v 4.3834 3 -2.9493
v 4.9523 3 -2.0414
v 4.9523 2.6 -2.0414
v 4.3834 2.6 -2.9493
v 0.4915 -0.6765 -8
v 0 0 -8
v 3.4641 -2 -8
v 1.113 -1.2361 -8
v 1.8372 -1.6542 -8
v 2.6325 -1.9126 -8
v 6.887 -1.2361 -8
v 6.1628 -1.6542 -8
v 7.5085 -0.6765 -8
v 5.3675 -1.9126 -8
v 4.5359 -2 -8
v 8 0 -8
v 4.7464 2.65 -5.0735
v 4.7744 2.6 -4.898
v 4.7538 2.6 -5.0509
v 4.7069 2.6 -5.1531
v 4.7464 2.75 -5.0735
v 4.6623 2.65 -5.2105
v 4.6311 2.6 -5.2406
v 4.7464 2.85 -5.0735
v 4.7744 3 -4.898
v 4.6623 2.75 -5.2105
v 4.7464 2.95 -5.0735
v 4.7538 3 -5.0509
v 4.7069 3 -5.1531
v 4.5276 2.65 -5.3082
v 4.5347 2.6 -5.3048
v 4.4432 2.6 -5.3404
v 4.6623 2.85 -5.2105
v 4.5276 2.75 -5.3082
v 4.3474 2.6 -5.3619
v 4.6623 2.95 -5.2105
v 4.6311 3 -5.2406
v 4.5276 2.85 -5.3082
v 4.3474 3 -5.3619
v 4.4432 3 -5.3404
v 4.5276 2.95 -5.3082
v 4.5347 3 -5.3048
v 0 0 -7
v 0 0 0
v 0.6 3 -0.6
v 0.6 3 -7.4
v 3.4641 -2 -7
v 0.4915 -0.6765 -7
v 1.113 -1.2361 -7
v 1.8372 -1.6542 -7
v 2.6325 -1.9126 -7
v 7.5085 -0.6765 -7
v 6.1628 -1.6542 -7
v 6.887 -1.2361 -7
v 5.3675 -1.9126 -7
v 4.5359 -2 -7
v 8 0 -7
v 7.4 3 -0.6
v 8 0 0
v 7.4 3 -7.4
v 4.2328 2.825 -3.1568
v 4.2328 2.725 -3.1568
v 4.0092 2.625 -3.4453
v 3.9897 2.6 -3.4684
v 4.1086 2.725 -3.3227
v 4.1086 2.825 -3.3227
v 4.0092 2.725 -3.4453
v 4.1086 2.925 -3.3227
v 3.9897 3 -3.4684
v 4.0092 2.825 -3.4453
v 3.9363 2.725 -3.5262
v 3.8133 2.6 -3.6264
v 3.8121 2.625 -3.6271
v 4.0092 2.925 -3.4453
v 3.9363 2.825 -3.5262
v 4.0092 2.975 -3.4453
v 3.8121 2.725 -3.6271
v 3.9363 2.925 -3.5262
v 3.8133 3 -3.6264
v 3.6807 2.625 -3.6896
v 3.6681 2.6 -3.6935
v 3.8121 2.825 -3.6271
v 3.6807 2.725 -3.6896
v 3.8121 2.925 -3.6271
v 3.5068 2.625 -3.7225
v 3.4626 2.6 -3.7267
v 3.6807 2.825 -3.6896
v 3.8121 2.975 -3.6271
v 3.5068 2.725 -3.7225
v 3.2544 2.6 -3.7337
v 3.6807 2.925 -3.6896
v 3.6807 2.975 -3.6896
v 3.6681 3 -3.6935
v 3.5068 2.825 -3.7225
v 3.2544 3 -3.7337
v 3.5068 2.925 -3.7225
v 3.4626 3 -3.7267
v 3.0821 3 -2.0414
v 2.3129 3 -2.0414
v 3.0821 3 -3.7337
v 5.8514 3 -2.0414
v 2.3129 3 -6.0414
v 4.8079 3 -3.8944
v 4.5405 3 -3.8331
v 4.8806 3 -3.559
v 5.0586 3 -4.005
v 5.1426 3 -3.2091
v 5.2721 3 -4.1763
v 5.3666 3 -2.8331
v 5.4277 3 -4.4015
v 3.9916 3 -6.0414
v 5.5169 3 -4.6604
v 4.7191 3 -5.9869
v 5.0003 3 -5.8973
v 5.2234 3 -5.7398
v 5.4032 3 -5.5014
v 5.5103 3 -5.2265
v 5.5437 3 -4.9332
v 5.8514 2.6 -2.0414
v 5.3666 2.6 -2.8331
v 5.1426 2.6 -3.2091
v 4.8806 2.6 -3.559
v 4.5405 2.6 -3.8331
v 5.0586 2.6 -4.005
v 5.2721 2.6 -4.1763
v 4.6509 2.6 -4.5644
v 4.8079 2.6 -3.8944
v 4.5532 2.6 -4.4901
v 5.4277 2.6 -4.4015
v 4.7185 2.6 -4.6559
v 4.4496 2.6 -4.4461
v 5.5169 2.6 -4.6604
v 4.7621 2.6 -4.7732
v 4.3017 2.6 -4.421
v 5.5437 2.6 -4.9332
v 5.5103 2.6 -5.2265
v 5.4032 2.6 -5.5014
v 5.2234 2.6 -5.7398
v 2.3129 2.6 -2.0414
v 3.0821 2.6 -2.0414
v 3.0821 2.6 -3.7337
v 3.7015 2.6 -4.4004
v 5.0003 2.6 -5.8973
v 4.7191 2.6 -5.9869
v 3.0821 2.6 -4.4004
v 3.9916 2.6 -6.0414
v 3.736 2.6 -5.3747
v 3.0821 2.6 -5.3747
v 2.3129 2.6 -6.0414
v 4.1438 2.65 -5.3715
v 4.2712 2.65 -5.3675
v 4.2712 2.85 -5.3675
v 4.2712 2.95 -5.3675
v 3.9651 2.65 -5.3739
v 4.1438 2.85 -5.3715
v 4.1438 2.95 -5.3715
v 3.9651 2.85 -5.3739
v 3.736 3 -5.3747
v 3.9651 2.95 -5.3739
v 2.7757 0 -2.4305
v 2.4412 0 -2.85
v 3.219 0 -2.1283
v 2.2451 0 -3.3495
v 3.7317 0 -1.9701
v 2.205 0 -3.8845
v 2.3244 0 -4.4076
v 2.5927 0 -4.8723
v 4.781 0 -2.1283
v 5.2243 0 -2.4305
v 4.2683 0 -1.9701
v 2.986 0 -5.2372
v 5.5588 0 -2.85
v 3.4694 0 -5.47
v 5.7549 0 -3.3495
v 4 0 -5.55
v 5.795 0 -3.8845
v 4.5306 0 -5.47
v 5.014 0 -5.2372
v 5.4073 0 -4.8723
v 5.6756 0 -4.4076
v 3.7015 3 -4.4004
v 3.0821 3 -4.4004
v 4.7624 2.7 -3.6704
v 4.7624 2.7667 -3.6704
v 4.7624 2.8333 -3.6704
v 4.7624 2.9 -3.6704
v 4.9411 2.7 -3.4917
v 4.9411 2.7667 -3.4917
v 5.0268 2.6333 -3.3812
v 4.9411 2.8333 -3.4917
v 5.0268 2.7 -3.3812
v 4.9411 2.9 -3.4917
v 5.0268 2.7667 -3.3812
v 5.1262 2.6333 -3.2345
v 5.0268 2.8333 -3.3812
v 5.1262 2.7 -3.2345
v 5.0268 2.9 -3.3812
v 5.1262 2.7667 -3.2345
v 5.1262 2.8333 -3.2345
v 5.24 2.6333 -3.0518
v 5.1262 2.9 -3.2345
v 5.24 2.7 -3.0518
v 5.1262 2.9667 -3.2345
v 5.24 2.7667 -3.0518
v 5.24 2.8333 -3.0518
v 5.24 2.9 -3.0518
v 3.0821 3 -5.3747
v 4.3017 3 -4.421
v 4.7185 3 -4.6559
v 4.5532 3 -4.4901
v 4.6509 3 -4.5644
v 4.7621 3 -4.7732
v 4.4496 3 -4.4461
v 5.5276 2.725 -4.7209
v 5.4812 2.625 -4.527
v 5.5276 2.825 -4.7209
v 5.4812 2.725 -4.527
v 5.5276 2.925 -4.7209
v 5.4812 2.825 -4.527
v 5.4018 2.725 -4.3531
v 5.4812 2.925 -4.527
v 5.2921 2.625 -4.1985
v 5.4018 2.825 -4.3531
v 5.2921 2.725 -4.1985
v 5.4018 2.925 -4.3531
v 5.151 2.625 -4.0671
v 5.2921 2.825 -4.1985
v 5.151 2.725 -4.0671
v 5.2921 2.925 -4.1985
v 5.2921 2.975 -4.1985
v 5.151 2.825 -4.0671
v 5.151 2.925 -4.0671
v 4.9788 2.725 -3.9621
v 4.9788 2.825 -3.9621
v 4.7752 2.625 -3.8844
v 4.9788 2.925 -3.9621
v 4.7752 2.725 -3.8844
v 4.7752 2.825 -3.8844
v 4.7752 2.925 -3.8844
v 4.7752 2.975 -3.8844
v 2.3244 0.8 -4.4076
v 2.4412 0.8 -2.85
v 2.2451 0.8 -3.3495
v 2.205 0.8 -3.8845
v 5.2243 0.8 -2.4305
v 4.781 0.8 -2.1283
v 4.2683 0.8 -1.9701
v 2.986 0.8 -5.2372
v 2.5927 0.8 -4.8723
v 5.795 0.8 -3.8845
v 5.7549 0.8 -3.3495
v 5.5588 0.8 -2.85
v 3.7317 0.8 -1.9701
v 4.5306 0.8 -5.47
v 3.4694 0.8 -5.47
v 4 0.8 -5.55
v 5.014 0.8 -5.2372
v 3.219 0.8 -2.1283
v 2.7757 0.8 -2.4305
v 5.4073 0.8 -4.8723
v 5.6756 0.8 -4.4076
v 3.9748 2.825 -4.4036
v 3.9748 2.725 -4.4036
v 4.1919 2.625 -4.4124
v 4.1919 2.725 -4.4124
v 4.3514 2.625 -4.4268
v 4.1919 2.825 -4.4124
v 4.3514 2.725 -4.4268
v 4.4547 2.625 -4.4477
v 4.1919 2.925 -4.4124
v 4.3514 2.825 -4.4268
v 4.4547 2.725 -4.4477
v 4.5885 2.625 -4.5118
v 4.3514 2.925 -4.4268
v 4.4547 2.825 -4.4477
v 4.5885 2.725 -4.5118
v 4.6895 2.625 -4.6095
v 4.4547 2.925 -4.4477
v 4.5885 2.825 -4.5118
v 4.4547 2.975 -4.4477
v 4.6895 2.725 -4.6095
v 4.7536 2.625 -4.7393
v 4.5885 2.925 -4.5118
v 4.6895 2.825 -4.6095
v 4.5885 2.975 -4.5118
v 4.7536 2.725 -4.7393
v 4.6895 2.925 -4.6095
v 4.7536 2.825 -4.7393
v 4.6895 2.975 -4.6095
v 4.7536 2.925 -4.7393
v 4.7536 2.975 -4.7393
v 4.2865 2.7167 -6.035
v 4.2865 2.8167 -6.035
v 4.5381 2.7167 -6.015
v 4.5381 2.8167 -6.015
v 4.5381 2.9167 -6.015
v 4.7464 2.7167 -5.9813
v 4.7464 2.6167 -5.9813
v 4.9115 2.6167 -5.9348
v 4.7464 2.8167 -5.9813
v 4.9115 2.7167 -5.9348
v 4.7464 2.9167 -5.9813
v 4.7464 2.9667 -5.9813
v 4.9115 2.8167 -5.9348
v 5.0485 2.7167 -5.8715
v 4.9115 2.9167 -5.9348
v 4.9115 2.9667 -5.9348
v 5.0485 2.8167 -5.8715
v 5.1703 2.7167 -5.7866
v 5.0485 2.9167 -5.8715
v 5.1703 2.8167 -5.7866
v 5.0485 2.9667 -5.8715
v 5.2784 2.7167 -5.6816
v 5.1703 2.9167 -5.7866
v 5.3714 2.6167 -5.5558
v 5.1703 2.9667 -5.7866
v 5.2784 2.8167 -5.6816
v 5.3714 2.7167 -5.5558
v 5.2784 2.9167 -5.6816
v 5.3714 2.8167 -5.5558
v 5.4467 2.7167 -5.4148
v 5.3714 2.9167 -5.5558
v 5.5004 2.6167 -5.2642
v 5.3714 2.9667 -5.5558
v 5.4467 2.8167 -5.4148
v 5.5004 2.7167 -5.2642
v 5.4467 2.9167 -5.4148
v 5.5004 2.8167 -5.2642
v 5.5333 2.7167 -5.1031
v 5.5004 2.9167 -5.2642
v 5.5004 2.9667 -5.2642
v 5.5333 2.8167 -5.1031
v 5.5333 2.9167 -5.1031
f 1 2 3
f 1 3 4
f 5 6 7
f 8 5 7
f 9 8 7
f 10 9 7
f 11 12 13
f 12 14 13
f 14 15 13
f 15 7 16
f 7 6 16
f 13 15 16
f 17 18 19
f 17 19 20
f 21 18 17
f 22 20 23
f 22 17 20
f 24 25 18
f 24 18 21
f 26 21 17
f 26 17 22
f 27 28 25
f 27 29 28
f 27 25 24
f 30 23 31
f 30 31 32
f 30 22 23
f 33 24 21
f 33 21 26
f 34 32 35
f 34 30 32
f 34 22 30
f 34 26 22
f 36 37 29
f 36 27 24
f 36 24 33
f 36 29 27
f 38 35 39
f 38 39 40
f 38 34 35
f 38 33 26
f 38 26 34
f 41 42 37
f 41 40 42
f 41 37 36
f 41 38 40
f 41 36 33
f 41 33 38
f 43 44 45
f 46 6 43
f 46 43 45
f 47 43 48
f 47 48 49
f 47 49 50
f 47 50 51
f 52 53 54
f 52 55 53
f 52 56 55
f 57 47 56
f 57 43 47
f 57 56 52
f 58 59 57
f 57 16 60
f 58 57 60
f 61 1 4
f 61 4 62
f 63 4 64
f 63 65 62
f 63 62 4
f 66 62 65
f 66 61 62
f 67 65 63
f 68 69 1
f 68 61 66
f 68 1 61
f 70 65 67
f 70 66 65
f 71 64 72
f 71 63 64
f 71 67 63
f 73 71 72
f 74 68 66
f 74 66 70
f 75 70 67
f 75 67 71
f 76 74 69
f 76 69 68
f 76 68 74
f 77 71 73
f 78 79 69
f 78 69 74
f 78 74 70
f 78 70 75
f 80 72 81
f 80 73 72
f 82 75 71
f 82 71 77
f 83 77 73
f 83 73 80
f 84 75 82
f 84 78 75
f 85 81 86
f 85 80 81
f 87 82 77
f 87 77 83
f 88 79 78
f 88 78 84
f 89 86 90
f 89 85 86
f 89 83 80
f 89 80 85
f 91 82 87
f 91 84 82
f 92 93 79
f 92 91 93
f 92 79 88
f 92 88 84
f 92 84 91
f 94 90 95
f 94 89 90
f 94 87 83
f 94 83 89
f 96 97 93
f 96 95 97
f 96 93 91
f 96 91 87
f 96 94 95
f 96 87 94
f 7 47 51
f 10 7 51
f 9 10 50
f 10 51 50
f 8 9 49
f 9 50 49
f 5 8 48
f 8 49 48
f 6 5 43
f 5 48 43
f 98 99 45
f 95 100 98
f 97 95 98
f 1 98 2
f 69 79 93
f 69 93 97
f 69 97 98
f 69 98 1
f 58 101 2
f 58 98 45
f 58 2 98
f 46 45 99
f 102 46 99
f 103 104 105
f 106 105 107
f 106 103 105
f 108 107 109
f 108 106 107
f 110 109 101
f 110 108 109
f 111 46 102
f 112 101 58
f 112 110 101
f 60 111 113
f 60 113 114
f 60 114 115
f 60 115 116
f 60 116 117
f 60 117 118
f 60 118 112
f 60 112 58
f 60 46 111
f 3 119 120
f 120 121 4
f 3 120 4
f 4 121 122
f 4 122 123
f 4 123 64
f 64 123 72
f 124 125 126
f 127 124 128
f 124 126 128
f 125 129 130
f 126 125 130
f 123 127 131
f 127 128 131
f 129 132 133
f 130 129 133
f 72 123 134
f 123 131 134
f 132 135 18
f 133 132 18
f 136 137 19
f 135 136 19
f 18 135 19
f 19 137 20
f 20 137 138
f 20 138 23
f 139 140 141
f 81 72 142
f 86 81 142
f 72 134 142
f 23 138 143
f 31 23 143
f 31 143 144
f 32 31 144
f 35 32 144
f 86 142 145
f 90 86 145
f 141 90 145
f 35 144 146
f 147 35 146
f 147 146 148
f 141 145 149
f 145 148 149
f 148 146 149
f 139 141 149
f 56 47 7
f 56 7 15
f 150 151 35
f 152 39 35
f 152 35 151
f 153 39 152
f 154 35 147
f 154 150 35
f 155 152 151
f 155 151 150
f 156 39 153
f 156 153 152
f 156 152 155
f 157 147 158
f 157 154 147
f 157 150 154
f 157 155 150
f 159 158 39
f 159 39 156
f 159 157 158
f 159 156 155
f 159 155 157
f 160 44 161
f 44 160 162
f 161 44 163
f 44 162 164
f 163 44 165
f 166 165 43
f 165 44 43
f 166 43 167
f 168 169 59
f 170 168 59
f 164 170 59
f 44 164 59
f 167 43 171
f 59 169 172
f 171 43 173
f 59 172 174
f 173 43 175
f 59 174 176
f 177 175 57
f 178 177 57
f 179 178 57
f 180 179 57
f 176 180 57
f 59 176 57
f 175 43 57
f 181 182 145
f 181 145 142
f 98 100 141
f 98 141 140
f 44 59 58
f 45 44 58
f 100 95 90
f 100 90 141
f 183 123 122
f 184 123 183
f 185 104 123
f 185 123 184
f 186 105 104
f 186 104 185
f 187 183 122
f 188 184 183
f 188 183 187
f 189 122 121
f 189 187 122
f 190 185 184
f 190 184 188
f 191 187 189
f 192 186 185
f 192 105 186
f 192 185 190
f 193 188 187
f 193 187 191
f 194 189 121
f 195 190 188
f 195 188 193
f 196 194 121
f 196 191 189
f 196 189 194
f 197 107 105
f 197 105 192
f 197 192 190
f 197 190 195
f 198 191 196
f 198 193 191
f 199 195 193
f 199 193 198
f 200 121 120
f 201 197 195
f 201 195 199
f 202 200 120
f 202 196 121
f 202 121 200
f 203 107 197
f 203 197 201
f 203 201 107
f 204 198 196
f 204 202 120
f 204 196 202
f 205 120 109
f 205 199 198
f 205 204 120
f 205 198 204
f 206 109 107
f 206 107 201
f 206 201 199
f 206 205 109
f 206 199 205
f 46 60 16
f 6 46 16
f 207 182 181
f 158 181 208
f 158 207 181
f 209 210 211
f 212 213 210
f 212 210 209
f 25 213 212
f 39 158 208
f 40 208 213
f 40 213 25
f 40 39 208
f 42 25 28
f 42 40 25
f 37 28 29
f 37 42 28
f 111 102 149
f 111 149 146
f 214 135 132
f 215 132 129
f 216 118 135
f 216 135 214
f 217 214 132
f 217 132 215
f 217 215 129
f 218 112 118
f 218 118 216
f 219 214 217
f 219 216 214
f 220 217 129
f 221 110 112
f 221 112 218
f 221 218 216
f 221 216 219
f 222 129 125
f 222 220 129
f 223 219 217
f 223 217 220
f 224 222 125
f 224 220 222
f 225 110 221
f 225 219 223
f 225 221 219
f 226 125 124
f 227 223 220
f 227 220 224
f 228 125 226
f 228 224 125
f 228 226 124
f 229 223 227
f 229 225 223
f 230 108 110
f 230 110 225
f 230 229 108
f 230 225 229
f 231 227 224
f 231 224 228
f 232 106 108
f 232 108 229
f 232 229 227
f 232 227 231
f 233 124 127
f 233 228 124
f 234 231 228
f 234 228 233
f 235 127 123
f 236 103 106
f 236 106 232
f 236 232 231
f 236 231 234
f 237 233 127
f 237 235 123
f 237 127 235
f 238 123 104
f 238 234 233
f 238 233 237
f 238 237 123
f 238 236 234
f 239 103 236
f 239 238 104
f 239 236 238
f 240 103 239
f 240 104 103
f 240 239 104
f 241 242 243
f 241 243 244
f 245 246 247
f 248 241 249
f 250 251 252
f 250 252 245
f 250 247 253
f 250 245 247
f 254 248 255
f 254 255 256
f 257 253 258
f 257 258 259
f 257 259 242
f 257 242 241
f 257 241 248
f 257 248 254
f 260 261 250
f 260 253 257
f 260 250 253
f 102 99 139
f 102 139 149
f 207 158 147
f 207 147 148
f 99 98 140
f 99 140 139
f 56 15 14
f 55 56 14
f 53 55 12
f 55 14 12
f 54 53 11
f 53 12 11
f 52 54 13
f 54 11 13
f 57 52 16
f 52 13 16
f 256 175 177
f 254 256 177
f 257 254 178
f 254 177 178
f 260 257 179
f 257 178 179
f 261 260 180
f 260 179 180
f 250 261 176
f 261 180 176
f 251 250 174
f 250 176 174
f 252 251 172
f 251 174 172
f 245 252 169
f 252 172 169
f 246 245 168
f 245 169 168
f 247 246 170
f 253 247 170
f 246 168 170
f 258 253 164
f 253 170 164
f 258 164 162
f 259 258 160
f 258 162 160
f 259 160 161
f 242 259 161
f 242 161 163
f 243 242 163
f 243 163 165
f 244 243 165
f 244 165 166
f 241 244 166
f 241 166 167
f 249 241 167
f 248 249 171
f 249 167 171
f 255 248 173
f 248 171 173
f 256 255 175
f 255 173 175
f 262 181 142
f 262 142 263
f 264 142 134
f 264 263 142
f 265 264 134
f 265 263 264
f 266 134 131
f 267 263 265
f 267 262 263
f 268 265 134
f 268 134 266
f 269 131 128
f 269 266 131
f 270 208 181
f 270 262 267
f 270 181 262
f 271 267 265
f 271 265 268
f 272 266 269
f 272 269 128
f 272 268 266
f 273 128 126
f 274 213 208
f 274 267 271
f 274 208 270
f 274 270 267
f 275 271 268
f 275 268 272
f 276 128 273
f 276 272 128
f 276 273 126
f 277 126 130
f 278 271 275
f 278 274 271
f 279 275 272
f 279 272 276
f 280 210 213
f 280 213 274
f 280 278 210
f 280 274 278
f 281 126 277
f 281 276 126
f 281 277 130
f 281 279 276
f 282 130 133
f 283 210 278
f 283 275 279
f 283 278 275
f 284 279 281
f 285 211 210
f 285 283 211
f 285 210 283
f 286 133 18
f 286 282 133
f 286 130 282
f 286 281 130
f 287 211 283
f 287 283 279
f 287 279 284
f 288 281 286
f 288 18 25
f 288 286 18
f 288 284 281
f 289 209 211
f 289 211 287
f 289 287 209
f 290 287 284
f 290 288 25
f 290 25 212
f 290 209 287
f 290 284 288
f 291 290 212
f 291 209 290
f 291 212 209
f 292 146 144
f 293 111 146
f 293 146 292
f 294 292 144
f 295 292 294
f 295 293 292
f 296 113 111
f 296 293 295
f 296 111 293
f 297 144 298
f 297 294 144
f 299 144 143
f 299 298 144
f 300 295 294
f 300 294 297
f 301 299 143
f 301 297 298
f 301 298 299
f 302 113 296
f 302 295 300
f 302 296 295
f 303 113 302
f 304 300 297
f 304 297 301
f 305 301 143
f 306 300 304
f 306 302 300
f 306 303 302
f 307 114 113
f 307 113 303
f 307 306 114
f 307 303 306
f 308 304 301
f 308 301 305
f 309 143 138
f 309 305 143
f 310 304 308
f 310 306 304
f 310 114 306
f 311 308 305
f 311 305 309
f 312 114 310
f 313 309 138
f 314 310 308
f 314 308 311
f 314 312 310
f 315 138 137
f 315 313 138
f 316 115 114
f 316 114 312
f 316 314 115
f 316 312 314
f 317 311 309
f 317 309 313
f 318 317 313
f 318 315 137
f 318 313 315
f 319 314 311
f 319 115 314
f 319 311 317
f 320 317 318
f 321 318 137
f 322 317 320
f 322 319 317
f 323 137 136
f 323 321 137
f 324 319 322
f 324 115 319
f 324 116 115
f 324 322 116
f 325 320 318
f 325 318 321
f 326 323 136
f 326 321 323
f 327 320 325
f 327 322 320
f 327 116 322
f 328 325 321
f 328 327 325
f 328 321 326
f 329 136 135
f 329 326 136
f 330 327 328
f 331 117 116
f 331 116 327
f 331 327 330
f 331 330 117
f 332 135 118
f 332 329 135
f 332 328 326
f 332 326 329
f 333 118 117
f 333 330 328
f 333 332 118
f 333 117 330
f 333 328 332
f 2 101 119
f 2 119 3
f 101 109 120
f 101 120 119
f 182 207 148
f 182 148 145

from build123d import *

# Parameters (mm, degrees)
SKETCH1_W               = 8
SKETCH1_H               = 8
BOSS_EXTRUDE1_DEPTH     = 3
CUT_EXTRUDE1_DEPTH      = 12.704699911
CUT_EXTRUDE1_DEPTH_BACK = 12.704699911
CUT_EXTRUDE2_DEPTH      = 11
SKETCH4_R               = 1.8
CUT_EXTRUDE3_DEPTH      = 0.8
SKETCH5_W               = 8
SKETCH5_H               = 1
BOSS_EXTRUDE2_DEPTH     = 2
FILLET1_R               = 4
CUT_EXTRUDE4_DEPTH      = 0.4


with BuildPart() as part:
    # Sketch1 → Boss-Extrude1 (new body)
    with BuildSketch(Plane(origin=(0, 0, 0), x_dir=(1, 0, 0), z_dir=(0, 1, 0))):
        with Locations((4, 4)):
            Rectangle(SKETCH1_W, SKETCH1_H)
    extrude(amount=BOSS_EXTRUDE1_DEPTH)

    # Sketch2 → Cut-Extrude1 (cut, two sides: drawn at the far end of the back side and taken through both)
    with BuildSketch(Plane.XY.offset(-CUT_EXTRUDE1_DEPTH_BACK)):
        Polygon((0, 0), (0.6, 3), (0, 3), align=None)
        Polygon((8, 0), (7.4, 3), (8, 3), align=None)
    extrude(amount=CUT_EXTRUDE1_DEPTH + CUT_EXTRUDE1_DEPTH_BACK, mode=Mode.SUBTRACT)

    # Sketch3 → Cut-Extrude2 (cut)
    with BuildSketch(Plane(origin=(0, 0, 0), x_dir=(0, 0, -1), z_dir=(1, 0, 0))):
        Polygon((0, 0), (0.6, 3), (0, 3), align=None)
        Polygon((8, 3), (7.4, 3), (8, 0), align=None)
    extrude(amount=CUT_EXTRUDE2_DEPTH, mode=Mode.SUBTRACT)

    # Sketch4 → Cut-Extrude3 (cut)
    with BuildSketch(Plane.XZ):
        with Locations(Location((4, -3.75, 0), (0, 0, 270))):
            Circle(SKETCH4_R)
    extrude(amount=-CUT_EXTRUDE3_DEPTH, mode=Mode.SUBTRACT)

    # Sketch5 → Boss-Extrude2 (add)
    with BuildSketch(Plane.XZ):
        with Locations((4, -7.5)):
            Rectangle(SKETCH5_W, SKETCH5_H)
    extrude(amount=BOSS_EXTRUDE2_DEPTH)

    # Fillet1
    # the kernel refuses this fillet: 4 mm, written as the material it takes off along each edge
    with BuildSketch(Plane(origin=(8, -2, -16.660254038), x_dir=(0, 1, 0), z_dir=(0, 0, 1)), Plane(origin=(0, -2, 1.660254038), x_dir=(0, 1, 0), z_dir=(0, 0, -1))) as fillet1_piece_1:
        with BuildLine():
            CenterArc((4, 3.464101615), FILLET1_R, 180, 60)
            Line((0, 3.464101615), (-0.08, 3.464101615))
            Line((-0.08, 3.464101615), (-0.08, 0))
            Line((-0.08, 0), (0, -0.08))
            ThreePointArc((0, -0.08), (1, -0.08), (1.96, -0.069282032))
            Line((1.96, -0.069282032), (2, 0))
        make_face()
    extrude(amount=18.320508076, mode=Mode.SUBTRACT)

    # Sketch6 → Cut-Extrude4 (cut)
    with BuildSketch(Plane(origin=(0, 3, 0), x_dir=(1, 0, 0), z_dir=(0, 1, 0))):
        with BuildLine():
            Line((2.312898911, 2.041410717), (2.312898911, 6.041410717))
            Line((2.312898911, 6.041410717), (3.991584808, 6.041410717))
            add(Edge.make_bspline(
                [(3.991584808, 6.041410717), (4.042601732, 6.041096301), (4.140920681, 6.040490364), (4.283109063, 6.036071747), (4.414238667, 6.026814487), (4.534891188, 6.016330564), (4.644487122, 6.001077132), (4.74345979, 5.982803671), (4.831642566, 5.961627249), (4.910322089, 5.936265049), (4.982061831, 5.90723713), (5.04889092, 5.87268574), (5.111544162, 5.83220454), (5.170983849, 5.787188805), (5.227461685, 5.737569368), (5.279429347, 5.682033053), (5.32779225, 5.621406813), (5.372511371, 5.556195062), (5.411906117, 5.48668575), (5.447902572, 5.415111184), (5.477205044, 5.340709703), (5.50140862, 5.263831792), (5.52074281, 5.184644366), (5.534162371, 5.102946099), (5.542540058, 5.018884869), (5.543287935, 4.962103945), (5.543668142, 4.93323764)],
                knots=[0, 0, 0, 0, 1.675828044, 3.229627355, 4.67171229, 5.993455049, 7.206927059, 8.304770529, 9.29850117, 10.183580433, 11.017754134, 11.837875825, 12.650738409, 13.464925643, 14.285328857, 15.117007378, 15.959673368, 16.830859064, 17.711229498, 18.58228265, 19.460420693, 20.334473227, 21.228207035, 22.135446768, 23.052097822, 24, 24, 24, 24], degree=3))
            add(Edge.make_bspline(
                [(5.543668142, 4.93323764), (5.542962916, 4.896874176), (5.541584712, 4.825809944), (5.528901745, 4.721651895), (5.5100643, 4.622136315), (5.483211668, 4.527125334), (5.446289845, 4.437736414), (5.403428122, 4.352717347), (5.352308317, 4.272356517), (5.293277733, 4.19745058), (5.226389218, 4.127933229), (5.151349641, 4.065235076), (5.06869476, 4.009111084), (4.977924564, 3.959884897), (4.879671091, 3.917801842), (4.77350828, 3.882394441), (4.659916733, 3.853576761), (4.580902516, 3.840017181), (4.540463013, 3.833077384)],
                knots=[0, 0, 0, 0, 1.05911256, 2.069797862, 3.05271628, 4.008392045, 4.940519534, 5.866323021, 6.779546087, 7.71056835, 8.640711998, 9.585328432, 10.554502533, 11.547017206, 12.589327225, 13.664782803, 14.804835066, 16, 16, 16, 16], degree=3))
            add(Edge.make_bspline(
                [(4.540463013, 3.833077384), (4.579572554, 3.807174767), (4.656115253, 3.756479818), (4.762017587, 3.672984601), (4.857092756, 3.585349912), (4.929078878, 3.507419696), (4.984392794, 3.438888442), (5.028929947, 3.378950347), (5.076970406, 3.309970293), (5.128042999, 3.231910907), (5.183657562, 3.145462828), (5.241745689, 3.049302835), (5.303522957, 2.944368887), (5.345058377, 2.871067212), (5.366584808, 2.833077384)],
                knots=[0, 0, 0, 0, 1.285445069, 2.515791127, 3.691898215, 4.826622834, 5.420063933, 6.105349801, 6.873086501, 7.723915395, 8.66222816, 9.690593598, 10.803111229, 12, 12, 12, 12], degree=3))
            Line((5.366584808, 2.833077384), (5.851360449, 2.041410717))
            Line((5.851360449, 2.041410717), (4.952321988, 2.041410717))
            Line((4.952321988, 2.041410717), (4.383411731, 2.949263281))
            add(Edge.make_bspline(
                [(4.383411731, 2.949263281), (4.357283981, 2.985622121), (4.307400733, 3.055038622), (4.235391184, 3.153681722), (4.169508837, 3.241491798), (4.111507042, 3.319740728), (4.058450932, 3.386209972), (4.011951502, 3.442057857), (3.972955886, 3.488482798), (3.928832249, 3.534515131), (3.877499082, 3.581823547), (3.813952721, 3.627691749), (3.748696505, 3.664257396), (3.678779681, 3.692157844), (3.597922987, 3.71161189), (3.500720436, 3.724006591), (3.384115753, 3.733151261), (3.299833928, 3.733519777), (3.254405321, 3.73371841)],
                knots=[0, 0, 0, 0, 1.465447777, 2.797841088, 3.997266218, 5.05856206, 5.985598736, 6.780315439, 7.437430484, 7.969193402, 8.866571936, 9.718200644, 10.52825214, 11.309096006, 12.174169268, 13.242355782, 14.513606761, 16, 16, 16, 16], degree=3))
            Line((3.254405321, 3.73371841), (3.08212968, 3.73371841))
            Line((3.08212968, 3.73371841), (3.08212968, 2.041410717))
            Line((3.08212968, 2.041410717), (2.312898911, 2.041410717))
        make_face()
        with BuildLine():
            Line((3.08212968, 4.400385076), (3.701520706, 4.400385076))
            add(Edge.make_bspline(
                [(3.701520706, 4.400385076), (3.749332843, 4.400487541), (3.840423044, 4.400682752), (3.969955122, 4.403510317), (4.085670885, 4.405910235), (4.186877859, 4.411940131), (4.274028855, 4.417916326), (4.346774263, 4.425683211), (4.405726987, 4.434863419), (4.464610849, 4.449136231), (4.52492793, 4.474003789), (4.589214527, 4.509422512), (4.644158691, 4.555370201), (4.691753027, 4.608490376), (4.728060837, 4.670937972), (4.756498441, 4.739930879), (4.770916908, 4.817002181), (4.773239296, 4.87042263), (4.774437372, 4.89798123)],
                knots=[0, 0, 0, 0, 1.697953026, 3.23488743, 4.60134403, 5.807846676, 6.835100678, 7.703488618, 8.405232423, 8.952775585, 9.851109663, 10.713519226, 11.549115941, 12.382556273, 13.233359028, 14.101746968, 15.020727134, 16, 16, 16, 16], degree=3))
            add(Edge.make_bspline(
                [(4.774437372, 4.89798123), (4.773074786, 4.928811222), (4.770445895, 4.98829272), (4.749714088, 5.072935459), (4.713527564, 5.147705664), (4.663829732, 5.212726785), (4.601441933, 5.267631557), (4.527131165, 5.311213996), (4.441449505, 5.343672387), (4.379650359, 5.355659208), (4.347354039, 5.361923538)],
                knots=[0, 0, 0, 0, 1.062977961, 2.050844577, 2.982300261, 3.90936959, 4.856017476, 5.831122378, 6.86654153, 8, 8, 8, 8], degree=3))
            add(Edge.make_bspline(
                [(4.347354039, 5.361923538), (4.336678458, 5.363096555), (4.311375089, 5.365876852), (4.266692338, 5.367662514), (4.20955971, 5.370407271), (4.139285669, 5.371528992), (4.056498042, 5.373495271), (3.960867626, 5.373856329), (3.852698247, 5.375009885), (3.776307493, 5.374835906), (3.735975834, 5.374744051)],
                knots=[0, 0, 0, 0, 0.42127143, 0.998501726, 1.753681744, 2.66564073, 3.755712164, 5.002818897, 6.417592707, 8, 8, 8, 8], degree=3))
            Line((3.735975834, 5.374744051), (3.08212968, 5.374744051))
            Line((3.08212968, 5.374744051), (3.08212968, 4.400385076))
        make_face(mode=Mode.SUBTRACT)
    extrude(amount=-CUT_EXTRUDE4_DEPTH, mode=Mode.SUBTRACT)


solid = part.part
